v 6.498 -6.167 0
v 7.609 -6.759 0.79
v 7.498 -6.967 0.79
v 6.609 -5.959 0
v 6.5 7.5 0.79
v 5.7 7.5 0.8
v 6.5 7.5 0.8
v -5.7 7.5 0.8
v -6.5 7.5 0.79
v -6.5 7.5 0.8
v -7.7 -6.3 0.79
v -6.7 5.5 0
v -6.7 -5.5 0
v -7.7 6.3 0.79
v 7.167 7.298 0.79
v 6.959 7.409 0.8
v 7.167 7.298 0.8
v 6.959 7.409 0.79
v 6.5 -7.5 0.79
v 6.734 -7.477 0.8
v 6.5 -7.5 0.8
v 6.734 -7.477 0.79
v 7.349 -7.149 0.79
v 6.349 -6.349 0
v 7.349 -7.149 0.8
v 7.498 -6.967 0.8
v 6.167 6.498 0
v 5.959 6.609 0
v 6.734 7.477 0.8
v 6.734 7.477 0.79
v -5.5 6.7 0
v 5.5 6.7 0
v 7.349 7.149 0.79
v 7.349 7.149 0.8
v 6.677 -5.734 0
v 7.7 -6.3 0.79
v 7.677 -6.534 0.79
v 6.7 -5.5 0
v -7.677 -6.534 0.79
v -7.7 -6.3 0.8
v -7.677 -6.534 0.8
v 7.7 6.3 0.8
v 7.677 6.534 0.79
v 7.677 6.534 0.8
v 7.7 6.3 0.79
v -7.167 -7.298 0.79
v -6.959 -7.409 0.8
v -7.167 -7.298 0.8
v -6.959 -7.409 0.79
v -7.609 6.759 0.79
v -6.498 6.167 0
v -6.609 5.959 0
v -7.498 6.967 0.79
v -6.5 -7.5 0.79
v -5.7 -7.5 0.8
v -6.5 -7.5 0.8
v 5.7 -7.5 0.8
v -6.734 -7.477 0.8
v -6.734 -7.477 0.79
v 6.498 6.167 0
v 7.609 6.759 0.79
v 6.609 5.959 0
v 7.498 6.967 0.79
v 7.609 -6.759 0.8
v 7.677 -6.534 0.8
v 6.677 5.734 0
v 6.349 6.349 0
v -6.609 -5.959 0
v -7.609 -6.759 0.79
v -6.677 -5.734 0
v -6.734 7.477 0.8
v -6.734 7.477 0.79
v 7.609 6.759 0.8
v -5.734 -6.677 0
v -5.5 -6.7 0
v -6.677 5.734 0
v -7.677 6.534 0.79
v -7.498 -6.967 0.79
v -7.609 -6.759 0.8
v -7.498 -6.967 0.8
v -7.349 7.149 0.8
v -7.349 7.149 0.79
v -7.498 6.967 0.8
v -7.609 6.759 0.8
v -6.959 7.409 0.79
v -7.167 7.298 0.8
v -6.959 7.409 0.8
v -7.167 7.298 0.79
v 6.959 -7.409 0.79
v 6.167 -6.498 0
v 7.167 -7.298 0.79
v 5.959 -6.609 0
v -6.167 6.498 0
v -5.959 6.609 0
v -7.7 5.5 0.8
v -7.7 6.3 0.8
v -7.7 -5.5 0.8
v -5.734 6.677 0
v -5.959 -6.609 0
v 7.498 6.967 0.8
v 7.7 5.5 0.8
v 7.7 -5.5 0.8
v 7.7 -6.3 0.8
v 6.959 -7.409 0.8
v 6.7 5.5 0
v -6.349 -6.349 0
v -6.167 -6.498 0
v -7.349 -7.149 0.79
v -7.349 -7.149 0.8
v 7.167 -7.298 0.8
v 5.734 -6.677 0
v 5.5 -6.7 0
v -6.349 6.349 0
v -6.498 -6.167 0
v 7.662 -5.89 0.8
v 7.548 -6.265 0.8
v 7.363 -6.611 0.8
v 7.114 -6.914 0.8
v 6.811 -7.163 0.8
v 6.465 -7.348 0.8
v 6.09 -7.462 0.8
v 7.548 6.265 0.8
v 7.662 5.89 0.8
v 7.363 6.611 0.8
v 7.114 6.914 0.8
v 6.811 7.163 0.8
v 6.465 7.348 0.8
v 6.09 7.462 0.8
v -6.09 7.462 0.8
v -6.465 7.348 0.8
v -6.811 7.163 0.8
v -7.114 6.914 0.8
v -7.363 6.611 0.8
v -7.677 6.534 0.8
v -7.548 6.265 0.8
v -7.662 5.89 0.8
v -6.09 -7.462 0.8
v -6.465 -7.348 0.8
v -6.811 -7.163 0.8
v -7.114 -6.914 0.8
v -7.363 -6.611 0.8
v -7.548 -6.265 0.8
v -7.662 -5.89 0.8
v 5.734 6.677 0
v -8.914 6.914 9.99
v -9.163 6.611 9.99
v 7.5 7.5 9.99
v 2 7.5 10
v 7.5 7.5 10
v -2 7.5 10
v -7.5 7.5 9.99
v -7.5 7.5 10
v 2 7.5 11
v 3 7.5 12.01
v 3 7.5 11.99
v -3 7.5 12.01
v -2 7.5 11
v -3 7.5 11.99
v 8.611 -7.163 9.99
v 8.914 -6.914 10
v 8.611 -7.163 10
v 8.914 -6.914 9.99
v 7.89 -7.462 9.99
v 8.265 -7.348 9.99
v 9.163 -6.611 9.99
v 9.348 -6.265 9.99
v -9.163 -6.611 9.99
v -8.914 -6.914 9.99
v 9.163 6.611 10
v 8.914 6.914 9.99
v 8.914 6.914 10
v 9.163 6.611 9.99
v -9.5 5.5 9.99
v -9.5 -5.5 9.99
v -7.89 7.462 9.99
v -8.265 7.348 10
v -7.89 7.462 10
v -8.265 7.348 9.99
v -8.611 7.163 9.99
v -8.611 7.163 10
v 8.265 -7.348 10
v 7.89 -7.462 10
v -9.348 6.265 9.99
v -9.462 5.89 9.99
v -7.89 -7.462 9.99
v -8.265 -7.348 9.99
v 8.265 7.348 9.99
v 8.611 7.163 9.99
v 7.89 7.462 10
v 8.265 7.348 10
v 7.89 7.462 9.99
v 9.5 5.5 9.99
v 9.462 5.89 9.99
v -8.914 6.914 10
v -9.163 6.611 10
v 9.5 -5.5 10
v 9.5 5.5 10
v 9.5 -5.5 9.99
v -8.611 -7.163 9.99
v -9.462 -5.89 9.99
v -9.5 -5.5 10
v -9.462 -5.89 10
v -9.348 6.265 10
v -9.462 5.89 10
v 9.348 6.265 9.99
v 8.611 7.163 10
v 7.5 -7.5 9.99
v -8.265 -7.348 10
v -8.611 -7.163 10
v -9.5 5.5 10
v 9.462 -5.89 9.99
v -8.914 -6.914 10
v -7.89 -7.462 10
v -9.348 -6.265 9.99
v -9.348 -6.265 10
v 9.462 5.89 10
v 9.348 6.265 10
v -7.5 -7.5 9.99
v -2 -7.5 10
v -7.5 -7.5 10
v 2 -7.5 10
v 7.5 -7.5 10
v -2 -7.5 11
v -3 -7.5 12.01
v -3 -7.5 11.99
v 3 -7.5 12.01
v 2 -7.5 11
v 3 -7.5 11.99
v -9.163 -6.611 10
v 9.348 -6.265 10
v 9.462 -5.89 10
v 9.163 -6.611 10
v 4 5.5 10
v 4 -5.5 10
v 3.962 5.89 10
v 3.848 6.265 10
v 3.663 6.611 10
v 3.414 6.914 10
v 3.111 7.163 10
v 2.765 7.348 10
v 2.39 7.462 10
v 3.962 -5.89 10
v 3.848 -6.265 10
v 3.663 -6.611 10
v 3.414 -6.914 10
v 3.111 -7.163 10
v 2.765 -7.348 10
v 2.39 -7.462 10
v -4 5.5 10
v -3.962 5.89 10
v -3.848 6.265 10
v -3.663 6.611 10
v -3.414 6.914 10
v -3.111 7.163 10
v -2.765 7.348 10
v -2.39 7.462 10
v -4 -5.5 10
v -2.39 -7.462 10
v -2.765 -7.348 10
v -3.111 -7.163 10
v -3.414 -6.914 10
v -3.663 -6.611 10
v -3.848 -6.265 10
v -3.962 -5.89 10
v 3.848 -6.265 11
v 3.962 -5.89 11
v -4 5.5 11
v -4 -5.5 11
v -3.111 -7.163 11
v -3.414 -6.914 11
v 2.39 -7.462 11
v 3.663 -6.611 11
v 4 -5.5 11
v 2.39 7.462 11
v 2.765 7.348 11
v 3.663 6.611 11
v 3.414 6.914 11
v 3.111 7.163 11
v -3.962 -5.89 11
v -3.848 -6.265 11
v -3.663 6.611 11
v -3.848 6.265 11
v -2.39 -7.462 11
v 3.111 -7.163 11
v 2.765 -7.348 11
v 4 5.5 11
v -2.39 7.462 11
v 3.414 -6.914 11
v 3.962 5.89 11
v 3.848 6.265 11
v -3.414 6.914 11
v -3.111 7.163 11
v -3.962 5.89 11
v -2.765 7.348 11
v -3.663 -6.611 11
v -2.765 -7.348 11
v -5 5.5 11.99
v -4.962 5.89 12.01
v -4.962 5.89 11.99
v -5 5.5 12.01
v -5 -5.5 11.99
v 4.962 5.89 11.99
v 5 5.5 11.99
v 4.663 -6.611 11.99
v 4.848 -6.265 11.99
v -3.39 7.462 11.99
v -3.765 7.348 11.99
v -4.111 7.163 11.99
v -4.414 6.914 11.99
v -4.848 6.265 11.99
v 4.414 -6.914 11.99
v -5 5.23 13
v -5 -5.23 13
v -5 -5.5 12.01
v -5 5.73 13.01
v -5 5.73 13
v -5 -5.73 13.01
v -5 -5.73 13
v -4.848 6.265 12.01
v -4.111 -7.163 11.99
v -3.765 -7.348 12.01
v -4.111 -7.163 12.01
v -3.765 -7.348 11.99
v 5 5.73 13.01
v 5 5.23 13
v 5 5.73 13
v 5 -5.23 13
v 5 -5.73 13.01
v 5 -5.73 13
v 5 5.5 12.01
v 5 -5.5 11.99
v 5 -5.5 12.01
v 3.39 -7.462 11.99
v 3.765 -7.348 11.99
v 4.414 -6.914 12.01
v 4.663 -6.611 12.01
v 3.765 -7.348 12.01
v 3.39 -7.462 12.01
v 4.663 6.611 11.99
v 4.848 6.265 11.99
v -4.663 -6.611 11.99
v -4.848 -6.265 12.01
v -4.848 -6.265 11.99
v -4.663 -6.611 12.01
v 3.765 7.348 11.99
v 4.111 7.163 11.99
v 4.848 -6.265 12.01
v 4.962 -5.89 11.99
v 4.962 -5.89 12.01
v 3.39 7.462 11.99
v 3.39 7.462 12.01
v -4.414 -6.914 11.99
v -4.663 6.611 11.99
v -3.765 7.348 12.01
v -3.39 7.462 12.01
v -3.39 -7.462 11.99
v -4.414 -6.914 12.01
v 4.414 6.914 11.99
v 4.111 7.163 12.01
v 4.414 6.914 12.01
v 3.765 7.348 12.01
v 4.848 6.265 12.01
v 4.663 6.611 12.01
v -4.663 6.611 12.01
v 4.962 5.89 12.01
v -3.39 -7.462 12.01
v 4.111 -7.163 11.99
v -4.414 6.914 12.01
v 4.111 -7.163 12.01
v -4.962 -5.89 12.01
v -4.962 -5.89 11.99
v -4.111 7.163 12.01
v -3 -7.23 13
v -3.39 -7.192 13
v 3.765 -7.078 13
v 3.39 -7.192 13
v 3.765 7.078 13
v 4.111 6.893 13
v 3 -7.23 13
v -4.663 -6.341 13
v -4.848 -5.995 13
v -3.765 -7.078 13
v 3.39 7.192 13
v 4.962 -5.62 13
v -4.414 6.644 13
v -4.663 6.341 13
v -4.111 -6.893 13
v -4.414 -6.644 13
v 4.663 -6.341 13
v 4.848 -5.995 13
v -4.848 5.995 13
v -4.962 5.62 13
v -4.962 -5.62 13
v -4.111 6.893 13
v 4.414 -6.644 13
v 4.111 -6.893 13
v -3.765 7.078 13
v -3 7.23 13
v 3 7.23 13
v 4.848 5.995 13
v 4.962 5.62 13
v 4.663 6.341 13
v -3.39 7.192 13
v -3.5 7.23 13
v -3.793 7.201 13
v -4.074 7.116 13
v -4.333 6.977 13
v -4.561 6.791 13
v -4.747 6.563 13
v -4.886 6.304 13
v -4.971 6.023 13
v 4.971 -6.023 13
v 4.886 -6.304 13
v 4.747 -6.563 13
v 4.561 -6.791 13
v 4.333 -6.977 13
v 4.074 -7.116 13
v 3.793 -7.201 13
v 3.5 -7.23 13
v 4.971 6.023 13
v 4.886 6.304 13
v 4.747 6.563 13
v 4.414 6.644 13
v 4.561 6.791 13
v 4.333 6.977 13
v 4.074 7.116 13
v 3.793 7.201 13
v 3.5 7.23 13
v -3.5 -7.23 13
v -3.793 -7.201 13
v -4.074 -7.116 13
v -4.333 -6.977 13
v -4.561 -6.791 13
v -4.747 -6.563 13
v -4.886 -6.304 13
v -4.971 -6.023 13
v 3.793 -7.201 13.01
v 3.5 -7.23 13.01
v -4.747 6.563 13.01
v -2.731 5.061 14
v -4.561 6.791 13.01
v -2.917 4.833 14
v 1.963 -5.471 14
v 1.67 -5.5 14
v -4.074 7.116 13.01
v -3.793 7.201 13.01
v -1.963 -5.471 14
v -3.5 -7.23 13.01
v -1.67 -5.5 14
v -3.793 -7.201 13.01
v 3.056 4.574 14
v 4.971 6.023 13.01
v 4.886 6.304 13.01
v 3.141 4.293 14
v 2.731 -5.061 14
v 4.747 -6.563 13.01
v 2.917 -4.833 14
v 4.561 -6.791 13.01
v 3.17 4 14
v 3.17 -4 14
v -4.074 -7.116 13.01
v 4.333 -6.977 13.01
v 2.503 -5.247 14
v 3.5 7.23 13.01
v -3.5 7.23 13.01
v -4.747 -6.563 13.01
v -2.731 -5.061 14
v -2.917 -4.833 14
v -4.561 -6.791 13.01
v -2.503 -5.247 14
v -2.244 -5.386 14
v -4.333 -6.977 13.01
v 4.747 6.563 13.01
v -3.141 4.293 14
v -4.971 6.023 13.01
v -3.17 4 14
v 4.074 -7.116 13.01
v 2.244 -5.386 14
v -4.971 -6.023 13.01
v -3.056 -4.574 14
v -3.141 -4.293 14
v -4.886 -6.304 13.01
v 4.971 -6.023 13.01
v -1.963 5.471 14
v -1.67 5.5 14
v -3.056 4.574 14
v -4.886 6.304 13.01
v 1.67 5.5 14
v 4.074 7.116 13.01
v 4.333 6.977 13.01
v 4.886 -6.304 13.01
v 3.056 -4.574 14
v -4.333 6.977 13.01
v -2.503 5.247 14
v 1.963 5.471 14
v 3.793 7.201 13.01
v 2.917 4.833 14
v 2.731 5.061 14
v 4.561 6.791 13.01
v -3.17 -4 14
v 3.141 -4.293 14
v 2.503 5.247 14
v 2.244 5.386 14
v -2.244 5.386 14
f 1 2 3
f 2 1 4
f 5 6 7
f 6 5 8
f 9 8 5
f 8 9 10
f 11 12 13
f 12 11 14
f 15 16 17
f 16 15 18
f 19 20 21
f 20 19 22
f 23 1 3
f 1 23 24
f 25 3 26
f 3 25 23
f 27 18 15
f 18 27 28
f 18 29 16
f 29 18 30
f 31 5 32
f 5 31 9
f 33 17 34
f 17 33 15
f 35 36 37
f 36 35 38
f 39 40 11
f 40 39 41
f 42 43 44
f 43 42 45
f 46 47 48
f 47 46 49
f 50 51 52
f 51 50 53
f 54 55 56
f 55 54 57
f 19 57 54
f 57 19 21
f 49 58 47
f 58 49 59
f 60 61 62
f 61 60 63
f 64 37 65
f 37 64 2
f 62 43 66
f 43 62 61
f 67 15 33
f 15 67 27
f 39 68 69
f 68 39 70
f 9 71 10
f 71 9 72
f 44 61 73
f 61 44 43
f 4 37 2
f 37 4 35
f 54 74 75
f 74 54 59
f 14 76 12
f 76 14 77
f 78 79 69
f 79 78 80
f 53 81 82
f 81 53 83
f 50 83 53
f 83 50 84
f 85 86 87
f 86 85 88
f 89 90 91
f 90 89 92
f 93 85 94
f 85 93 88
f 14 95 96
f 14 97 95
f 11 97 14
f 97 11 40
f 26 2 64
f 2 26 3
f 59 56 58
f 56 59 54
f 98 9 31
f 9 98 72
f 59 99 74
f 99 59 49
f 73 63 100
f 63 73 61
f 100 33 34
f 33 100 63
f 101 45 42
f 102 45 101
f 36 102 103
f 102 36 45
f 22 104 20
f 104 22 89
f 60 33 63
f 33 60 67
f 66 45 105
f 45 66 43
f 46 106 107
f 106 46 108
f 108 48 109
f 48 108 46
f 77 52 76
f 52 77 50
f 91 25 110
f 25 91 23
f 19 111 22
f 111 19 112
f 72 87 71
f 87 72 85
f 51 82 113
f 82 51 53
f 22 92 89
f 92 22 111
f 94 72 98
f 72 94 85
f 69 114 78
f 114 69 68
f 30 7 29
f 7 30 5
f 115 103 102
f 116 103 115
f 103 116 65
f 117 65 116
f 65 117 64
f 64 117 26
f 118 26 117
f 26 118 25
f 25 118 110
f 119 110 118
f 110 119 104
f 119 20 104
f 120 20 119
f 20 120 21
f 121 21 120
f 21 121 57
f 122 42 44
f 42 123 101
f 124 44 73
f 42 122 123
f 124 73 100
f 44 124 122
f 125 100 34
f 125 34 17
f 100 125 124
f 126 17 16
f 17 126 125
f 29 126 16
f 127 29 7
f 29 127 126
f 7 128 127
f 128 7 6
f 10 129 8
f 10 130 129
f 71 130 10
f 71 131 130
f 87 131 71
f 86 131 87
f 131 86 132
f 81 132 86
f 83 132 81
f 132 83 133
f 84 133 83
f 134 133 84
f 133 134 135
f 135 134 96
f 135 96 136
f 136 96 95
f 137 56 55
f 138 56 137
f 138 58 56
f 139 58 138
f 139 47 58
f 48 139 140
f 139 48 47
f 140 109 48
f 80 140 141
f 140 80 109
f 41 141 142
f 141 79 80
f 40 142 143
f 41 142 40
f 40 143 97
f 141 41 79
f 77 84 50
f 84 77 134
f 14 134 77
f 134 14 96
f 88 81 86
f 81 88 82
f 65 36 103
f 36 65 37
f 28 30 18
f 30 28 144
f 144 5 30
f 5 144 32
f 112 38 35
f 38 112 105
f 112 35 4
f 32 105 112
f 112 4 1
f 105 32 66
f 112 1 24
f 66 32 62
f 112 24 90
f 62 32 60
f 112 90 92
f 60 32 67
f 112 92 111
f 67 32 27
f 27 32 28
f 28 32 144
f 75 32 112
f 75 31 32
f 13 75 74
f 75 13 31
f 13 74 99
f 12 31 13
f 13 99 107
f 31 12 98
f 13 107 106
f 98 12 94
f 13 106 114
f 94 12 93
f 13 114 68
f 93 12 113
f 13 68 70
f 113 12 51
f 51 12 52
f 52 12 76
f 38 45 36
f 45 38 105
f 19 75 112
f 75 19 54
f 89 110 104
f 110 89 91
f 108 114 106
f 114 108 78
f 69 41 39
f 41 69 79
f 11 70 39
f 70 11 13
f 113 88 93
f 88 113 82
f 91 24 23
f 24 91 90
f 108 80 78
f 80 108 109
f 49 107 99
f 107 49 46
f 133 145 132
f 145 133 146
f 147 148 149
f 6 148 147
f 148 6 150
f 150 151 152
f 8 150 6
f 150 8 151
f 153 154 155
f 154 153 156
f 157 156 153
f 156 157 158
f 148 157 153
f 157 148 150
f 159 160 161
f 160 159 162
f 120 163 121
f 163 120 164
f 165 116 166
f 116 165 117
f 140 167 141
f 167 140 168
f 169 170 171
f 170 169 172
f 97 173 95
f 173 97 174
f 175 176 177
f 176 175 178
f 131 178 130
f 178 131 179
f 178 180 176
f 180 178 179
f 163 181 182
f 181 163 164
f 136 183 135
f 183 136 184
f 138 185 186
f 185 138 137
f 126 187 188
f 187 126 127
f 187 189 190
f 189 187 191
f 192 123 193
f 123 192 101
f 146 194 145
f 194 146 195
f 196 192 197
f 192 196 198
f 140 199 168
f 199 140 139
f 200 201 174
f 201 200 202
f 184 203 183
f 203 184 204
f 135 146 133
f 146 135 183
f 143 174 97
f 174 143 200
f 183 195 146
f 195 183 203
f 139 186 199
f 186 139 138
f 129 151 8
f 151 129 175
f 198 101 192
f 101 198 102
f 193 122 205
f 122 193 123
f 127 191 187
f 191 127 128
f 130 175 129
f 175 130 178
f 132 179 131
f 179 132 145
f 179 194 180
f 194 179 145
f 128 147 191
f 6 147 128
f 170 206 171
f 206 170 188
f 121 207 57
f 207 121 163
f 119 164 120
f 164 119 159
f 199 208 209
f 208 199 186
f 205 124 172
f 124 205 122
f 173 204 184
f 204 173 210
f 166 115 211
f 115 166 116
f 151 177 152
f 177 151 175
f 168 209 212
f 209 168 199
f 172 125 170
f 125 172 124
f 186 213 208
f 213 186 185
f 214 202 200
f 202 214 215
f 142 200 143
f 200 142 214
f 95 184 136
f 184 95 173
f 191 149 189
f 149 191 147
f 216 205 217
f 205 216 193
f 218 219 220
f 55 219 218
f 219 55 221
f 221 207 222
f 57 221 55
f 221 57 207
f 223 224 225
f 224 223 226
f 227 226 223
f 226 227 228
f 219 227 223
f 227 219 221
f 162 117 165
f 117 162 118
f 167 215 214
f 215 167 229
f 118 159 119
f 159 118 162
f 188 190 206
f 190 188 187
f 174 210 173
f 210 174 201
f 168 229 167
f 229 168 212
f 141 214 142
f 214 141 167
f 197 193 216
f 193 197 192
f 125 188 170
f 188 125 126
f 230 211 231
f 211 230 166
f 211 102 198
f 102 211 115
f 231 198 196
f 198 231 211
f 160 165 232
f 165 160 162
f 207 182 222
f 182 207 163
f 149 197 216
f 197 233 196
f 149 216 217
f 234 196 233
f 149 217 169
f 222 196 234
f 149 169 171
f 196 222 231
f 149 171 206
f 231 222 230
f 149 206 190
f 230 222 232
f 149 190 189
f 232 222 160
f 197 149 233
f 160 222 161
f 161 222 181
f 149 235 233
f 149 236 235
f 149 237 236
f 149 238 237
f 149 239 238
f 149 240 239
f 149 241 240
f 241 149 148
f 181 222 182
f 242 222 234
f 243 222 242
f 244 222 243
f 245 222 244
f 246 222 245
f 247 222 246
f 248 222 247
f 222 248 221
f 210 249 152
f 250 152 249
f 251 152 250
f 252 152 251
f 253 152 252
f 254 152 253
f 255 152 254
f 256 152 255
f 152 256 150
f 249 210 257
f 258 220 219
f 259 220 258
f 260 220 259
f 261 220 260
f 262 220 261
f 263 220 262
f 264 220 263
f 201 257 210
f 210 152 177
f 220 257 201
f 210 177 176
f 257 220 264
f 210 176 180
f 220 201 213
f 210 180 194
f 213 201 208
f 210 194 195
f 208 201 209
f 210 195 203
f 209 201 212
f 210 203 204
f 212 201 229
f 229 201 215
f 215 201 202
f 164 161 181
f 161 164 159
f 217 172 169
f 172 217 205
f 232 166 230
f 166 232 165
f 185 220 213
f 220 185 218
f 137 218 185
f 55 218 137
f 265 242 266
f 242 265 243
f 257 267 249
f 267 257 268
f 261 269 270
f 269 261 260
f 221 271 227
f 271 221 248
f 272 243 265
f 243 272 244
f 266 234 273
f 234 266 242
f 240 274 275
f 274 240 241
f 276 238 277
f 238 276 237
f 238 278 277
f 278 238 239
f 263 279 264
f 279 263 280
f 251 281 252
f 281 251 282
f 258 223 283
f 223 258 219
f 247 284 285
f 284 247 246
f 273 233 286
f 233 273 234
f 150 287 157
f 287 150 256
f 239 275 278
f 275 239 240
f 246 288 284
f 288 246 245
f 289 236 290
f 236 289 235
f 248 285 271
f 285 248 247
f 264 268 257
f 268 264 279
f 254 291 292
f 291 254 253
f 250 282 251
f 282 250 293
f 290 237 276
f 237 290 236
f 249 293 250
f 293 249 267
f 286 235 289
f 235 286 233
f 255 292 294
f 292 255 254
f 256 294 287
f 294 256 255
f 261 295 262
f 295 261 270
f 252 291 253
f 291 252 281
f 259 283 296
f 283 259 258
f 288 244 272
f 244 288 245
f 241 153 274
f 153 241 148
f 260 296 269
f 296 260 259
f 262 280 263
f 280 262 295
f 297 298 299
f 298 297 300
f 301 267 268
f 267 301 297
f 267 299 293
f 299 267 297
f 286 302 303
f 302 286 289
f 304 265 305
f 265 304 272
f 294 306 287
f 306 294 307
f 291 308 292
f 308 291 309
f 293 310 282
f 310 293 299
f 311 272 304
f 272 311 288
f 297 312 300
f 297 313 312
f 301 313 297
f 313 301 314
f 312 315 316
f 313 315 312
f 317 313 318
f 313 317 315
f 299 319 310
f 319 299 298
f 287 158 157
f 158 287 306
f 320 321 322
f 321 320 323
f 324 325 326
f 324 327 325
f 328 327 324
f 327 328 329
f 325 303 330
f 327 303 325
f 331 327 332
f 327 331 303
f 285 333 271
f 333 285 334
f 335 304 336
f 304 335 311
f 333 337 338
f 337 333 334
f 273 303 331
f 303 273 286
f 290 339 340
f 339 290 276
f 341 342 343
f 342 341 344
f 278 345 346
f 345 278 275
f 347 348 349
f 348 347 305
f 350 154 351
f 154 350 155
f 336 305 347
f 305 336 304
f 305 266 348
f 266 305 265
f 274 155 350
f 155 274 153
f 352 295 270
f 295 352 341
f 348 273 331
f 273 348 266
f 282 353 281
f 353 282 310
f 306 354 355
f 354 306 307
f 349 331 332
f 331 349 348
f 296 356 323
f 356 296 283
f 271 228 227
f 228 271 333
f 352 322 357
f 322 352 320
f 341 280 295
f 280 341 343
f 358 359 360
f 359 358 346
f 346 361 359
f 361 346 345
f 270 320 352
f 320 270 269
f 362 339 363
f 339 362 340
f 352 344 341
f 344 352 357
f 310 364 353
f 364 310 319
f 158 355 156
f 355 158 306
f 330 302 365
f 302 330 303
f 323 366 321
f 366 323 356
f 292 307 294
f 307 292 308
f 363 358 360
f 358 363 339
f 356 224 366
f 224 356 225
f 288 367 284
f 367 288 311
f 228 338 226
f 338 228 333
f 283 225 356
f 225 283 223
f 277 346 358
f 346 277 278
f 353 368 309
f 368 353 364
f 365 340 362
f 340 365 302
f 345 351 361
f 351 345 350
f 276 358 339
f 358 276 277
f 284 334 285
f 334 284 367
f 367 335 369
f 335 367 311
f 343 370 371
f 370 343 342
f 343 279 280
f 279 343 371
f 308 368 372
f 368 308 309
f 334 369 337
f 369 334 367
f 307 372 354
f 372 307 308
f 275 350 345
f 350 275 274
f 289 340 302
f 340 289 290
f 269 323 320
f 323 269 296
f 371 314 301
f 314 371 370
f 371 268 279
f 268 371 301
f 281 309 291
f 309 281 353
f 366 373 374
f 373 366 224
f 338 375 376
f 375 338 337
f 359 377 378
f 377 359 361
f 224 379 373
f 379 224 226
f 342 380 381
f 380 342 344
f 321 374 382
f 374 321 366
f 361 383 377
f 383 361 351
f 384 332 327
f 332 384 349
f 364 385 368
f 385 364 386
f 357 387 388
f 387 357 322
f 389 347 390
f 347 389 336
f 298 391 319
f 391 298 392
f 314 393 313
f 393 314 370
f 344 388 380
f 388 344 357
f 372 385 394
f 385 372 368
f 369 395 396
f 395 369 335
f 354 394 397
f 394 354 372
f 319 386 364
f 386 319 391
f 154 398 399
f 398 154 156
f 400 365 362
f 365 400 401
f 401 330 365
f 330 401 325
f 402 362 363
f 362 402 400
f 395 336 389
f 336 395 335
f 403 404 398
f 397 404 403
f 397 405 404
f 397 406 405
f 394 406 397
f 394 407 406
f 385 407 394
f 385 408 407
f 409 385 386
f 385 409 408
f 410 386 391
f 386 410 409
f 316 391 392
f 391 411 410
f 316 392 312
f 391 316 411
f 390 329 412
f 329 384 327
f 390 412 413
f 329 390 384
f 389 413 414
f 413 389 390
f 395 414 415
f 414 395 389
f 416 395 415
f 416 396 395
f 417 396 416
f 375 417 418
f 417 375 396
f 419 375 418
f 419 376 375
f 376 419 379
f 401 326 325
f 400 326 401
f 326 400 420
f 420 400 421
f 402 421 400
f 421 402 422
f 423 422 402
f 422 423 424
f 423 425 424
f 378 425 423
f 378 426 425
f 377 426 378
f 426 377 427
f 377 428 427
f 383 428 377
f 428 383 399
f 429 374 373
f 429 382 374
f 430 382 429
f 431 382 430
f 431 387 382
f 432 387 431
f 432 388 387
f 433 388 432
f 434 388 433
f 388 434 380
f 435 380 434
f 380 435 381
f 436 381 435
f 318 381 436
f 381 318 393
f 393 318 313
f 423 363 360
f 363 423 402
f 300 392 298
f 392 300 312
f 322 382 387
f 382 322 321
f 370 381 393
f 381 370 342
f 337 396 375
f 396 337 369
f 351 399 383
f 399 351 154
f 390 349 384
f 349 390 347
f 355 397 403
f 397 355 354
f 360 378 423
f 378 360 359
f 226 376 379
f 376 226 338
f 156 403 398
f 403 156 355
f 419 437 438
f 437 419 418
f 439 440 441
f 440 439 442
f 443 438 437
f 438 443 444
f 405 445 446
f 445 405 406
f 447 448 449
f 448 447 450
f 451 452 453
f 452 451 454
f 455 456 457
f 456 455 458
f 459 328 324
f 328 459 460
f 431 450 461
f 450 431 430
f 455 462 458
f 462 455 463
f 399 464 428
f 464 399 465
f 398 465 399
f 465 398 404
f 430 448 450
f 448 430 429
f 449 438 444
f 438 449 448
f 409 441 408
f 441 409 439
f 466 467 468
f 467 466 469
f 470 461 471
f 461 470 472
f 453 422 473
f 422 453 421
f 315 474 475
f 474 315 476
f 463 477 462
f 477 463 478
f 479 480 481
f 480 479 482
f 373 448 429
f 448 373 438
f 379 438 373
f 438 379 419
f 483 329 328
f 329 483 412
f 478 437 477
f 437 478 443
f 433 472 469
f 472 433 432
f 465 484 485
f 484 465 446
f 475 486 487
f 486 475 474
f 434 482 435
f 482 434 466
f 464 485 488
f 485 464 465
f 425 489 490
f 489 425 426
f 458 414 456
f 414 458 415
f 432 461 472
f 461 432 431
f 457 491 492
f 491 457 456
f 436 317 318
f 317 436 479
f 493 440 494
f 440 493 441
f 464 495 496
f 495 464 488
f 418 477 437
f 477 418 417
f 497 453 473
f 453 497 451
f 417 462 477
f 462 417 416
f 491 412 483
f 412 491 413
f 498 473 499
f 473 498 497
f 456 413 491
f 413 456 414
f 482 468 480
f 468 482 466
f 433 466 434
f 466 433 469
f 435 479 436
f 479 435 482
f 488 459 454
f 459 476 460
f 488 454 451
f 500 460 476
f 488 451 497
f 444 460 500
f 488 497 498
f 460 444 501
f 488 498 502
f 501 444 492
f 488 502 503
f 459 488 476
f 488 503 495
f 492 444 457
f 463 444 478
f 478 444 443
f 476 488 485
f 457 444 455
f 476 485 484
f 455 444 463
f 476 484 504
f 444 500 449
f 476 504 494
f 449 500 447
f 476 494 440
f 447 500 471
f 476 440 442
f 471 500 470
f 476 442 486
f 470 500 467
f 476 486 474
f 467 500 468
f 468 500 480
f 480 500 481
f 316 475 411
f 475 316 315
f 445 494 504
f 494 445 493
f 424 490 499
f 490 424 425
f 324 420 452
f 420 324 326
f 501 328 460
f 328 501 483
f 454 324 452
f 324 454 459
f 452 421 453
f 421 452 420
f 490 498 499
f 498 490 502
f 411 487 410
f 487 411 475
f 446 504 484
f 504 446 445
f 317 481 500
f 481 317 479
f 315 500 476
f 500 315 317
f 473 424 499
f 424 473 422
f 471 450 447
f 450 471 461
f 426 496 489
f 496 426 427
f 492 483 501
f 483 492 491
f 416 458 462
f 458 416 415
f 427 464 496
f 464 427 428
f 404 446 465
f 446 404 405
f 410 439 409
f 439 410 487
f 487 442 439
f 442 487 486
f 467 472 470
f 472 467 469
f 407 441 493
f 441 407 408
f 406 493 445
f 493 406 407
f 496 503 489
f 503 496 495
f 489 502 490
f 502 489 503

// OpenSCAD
// simple recreation of a tapered foot with a 2020 extrusion dovetail
// based on eyeballing the original Prusa i3 foot design IRL
// should be printed in TPU, TPE, or other flexible filament
// PP or PCL might work but who has time for that

$fn = 32;

// Rounded rectangular cross-section
module profile(w, d, r = 2) {
  offset(r=r)
    square([w - 2 * r, d - 2 * r], center=true);
}

// Connect two profiles
module taper(z1, w1, d1, z2, w2, d2, r = 2) {
  hull() {
    translate([0, 0, z1])
      linear_extrude(0.01)
        profile(w1, d1, r);
    translate([0, 0, z2 - 0.01])
      linear_extrude(0.01)
        profile(w2, d2, r);
  }
}

union() {
  // Tapered foot
  taper(0, 13.4, 13.4, 0.8, 15.4, 15, 1.2);
  taper(0.8, 15.4, 15, 10, 19, 15);

  // 2020 extrusion dovetail
  taper(10, 8, 15, 11, 8, 15);
  taper(11, 8, 15, 12, 10, 15);
  taper(12, 10, 15, 13, 10, 14.46);
  taper(13, 10, 14.46, 14, 6.34, 11, 1.5);
}
